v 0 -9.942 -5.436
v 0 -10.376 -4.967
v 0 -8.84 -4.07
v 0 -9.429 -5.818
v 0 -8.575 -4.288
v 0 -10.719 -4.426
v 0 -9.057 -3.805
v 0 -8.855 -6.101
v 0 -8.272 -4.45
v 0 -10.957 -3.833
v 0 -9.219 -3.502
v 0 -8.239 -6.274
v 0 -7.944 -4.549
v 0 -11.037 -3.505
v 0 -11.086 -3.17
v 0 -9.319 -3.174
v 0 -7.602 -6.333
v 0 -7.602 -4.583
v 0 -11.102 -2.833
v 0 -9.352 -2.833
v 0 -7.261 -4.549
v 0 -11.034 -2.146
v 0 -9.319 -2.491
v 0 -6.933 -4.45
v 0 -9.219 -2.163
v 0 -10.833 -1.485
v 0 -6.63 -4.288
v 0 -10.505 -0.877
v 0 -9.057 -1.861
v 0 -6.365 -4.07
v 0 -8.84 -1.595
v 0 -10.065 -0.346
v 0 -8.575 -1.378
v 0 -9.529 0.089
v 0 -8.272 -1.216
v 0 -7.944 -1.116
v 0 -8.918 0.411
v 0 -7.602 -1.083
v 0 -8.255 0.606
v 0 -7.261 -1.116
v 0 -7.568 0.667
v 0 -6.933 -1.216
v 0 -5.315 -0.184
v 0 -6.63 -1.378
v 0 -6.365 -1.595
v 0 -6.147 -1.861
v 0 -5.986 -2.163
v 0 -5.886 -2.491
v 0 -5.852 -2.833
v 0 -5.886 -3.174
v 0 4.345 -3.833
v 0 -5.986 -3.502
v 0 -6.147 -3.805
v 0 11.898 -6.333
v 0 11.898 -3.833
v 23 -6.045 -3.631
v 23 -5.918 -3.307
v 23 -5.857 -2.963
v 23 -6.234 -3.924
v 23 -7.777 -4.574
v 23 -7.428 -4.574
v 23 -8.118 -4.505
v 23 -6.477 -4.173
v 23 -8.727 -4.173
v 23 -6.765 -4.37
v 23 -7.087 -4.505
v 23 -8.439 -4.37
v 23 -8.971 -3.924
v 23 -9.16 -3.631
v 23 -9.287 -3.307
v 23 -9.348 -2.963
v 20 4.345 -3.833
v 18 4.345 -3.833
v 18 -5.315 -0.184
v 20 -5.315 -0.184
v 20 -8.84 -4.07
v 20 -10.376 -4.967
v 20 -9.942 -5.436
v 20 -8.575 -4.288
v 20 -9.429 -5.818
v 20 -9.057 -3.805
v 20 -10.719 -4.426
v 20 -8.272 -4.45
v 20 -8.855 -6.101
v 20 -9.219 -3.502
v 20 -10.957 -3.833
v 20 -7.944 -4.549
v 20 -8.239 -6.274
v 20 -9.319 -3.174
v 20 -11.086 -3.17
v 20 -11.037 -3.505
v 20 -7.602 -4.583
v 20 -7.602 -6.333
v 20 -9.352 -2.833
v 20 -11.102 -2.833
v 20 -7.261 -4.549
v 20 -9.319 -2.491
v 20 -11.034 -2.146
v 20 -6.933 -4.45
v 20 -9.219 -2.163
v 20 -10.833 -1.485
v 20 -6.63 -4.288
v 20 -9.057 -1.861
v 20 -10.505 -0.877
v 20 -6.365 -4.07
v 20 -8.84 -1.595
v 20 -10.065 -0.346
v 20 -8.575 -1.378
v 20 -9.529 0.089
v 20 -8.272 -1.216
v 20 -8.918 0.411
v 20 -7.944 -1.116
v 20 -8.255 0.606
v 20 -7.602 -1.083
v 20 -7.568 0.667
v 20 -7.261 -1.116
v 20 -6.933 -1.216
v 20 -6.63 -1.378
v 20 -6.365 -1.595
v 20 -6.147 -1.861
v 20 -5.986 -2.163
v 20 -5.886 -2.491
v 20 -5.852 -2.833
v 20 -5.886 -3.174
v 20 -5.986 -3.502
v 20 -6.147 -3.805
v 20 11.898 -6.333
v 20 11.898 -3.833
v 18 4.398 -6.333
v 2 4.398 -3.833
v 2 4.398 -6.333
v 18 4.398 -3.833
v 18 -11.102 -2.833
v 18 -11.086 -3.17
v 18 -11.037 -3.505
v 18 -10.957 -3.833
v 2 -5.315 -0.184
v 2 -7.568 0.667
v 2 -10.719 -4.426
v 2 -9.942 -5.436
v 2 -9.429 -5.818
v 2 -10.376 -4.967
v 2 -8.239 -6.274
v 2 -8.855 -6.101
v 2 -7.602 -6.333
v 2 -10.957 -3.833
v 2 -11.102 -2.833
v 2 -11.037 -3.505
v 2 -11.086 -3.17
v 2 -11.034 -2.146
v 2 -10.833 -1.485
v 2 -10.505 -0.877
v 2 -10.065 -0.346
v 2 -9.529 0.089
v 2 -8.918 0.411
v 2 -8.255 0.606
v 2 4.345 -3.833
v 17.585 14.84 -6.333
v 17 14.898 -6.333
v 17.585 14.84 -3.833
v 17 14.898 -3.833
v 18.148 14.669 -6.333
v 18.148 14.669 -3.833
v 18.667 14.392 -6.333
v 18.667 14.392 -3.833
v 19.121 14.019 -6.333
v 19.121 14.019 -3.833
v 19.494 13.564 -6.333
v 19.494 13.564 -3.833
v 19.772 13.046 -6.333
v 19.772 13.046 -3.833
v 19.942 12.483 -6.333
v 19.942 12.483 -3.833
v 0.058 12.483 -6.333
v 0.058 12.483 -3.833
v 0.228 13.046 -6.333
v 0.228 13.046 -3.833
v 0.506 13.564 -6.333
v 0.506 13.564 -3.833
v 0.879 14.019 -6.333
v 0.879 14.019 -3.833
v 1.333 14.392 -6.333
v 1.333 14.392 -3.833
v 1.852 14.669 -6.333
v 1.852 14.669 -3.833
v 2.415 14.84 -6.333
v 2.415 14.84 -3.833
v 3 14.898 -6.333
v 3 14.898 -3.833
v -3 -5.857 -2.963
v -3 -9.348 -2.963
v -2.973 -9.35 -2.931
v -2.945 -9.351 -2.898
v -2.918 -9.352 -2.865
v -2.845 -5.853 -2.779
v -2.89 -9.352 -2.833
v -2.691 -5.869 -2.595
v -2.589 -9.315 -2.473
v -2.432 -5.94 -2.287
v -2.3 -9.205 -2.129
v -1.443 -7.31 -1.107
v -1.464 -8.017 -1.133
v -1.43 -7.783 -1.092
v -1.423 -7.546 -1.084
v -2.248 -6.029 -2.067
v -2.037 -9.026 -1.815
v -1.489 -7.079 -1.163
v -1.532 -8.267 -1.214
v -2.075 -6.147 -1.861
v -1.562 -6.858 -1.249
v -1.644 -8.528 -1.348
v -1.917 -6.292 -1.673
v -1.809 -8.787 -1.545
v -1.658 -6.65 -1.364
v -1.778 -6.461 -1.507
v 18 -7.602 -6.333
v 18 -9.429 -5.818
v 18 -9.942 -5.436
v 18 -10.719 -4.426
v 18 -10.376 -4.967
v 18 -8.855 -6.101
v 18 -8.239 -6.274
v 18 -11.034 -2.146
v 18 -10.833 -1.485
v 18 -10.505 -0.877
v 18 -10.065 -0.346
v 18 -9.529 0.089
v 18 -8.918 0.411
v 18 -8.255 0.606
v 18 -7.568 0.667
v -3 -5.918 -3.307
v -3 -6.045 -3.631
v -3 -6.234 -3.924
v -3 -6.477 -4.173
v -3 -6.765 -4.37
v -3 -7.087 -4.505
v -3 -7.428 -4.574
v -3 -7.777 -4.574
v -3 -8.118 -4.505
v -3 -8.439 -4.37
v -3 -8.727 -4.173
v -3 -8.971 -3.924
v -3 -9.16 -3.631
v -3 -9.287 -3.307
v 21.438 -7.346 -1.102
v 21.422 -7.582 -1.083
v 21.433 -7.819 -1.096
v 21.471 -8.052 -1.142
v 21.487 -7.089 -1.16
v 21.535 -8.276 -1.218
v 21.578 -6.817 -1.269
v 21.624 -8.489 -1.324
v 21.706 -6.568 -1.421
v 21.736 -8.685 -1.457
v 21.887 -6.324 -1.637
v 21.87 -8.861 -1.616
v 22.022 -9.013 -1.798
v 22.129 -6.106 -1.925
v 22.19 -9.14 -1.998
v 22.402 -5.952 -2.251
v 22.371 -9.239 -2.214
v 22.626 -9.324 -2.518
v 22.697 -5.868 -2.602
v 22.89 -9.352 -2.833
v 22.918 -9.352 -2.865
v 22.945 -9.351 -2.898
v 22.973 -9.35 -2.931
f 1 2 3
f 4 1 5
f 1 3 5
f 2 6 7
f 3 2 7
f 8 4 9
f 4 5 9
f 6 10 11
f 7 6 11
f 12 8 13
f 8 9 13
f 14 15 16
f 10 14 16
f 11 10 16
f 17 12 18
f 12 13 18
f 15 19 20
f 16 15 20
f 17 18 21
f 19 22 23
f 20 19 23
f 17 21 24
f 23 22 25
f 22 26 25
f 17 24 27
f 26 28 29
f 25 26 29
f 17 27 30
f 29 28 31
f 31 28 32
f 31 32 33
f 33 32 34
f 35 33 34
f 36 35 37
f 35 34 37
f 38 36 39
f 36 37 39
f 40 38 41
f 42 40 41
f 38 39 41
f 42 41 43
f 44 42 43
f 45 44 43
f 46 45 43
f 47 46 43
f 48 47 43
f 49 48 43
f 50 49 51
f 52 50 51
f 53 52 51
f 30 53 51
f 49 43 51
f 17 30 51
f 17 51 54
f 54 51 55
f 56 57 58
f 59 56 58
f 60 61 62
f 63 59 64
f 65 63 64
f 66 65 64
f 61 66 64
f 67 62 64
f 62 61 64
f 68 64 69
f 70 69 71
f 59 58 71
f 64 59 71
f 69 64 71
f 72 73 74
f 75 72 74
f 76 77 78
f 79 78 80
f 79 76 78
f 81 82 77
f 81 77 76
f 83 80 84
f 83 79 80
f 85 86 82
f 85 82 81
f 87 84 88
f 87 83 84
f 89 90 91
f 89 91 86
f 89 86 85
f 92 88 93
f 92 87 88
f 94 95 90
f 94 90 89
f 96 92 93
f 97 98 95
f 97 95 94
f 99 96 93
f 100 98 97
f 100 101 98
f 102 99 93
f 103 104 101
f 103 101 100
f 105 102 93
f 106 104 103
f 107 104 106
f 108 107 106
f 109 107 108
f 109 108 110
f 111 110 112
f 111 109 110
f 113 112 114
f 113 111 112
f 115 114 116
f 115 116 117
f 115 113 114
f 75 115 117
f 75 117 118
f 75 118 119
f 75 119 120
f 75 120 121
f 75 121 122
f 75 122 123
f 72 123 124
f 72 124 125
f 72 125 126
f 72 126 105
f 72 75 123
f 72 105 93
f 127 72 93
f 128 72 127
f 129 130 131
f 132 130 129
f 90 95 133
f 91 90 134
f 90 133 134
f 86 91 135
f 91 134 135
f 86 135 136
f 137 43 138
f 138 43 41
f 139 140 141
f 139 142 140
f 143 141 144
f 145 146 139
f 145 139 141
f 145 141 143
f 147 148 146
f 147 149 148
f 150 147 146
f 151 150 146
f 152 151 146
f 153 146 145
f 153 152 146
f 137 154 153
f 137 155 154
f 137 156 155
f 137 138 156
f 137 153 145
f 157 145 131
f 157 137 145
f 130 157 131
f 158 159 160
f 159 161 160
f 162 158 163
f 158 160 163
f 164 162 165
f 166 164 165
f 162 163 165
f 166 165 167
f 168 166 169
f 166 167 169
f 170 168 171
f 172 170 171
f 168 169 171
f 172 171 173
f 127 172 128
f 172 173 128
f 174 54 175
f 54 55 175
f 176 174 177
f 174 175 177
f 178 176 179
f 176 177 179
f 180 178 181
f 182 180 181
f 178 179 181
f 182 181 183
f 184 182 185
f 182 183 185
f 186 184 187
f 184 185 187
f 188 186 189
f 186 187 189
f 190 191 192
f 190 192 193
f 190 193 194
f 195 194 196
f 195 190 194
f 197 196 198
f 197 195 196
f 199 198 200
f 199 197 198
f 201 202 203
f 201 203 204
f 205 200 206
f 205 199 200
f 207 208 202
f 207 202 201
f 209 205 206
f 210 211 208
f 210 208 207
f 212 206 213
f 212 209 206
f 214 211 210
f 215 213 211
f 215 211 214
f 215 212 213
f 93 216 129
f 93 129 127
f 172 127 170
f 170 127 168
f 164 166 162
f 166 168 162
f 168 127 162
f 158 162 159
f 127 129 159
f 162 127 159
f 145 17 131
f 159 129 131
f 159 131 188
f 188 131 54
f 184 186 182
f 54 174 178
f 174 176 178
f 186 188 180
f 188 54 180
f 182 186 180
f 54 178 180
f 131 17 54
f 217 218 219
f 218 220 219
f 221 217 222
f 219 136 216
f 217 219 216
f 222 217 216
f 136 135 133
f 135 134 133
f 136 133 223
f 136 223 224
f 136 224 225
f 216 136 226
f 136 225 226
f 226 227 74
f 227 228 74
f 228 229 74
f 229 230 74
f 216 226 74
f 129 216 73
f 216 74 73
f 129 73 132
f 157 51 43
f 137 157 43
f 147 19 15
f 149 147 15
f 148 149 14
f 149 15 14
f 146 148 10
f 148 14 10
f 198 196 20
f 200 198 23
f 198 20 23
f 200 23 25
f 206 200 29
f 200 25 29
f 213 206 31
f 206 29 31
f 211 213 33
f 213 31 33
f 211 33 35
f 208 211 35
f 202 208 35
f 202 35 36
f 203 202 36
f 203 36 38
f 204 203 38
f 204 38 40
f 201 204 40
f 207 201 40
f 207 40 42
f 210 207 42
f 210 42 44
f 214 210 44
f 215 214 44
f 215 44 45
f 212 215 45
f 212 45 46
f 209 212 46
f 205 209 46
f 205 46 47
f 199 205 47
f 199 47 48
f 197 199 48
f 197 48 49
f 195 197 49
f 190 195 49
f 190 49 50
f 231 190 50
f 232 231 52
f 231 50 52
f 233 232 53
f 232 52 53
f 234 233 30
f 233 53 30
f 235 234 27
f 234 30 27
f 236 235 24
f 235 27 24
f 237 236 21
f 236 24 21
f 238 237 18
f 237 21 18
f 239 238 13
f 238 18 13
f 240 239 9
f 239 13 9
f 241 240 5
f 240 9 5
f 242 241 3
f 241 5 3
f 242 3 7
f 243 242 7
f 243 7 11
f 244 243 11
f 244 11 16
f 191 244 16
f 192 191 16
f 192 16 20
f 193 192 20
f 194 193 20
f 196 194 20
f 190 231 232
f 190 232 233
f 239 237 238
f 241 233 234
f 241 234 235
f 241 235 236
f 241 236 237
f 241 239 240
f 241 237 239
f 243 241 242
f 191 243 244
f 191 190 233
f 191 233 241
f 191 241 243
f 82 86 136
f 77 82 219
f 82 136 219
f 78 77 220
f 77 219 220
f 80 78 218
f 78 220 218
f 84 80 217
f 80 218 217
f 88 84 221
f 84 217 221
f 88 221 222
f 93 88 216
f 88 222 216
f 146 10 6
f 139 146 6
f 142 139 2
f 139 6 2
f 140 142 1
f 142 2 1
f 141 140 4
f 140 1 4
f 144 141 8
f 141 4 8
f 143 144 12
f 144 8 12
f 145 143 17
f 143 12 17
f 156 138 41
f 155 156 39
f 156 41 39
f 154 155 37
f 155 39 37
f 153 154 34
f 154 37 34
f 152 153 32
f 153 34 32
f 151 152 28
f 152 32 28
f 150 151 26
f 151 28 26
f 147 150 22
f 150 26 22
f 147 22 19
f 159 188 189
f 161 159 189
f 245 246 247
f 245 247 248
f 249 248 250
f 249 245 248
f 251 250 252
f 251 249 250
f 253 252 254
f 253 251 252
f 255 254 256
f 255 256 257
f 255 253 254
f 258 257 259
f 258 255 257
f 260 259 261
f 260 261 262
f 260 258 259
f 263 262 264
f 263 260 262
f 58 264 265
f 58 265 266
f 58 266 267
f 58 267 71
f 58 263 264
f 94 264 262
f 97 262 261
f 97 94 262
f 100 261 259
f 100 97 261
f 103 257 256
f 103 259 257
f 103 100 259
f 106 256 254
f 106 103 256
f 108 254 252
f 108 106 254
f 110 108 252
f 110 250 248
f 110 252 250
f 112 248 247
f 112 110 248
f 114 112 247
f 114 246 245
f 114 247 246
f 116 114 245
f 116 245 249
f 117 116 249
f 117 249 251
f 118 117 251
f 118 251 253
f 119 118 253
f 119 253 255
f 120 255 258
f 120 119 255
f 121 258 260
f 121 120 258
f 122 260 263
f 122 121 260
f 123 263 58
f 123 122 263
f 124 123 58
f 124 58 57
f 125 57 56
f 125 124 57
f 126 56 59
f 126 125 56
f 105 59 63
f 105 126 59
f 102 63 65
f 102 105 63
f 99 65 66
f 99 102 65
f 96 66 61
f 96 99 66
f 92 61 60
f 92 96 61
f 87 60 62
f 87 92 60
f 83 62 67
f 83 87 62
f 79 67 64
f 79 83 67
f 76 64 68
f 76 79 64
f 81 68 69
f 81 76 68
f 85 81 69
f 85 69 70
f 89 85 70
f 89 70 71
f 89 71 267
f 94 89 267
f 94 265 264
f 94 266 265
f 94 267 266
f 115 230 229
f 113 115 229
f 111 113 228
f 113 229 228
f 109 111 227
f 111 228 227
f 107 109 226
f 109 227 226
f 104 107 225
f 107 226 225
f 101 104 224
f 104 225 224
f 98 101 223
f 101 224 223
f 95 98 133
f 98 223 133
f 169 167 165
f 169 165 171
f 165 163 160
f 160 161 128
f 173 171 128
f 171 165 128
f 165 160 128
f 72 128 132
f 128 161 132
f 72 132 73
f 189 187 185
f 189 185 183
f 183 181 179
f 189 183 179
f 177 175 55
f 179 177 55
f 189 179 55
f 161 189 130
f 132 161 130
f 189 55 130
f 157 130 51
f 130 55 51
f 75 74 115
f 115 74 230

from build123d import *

# Parameters (mm, degrees)
F1_DEPTH  = 20
F2_R      = 1.75
F3_DEPTH  = 3
F6_W      = 16
F6_H      = 35.2884006159
F7_DEPTH  = 12.5
F8_R      = 3
F10_DEPTH = 25


with BuildPart() as f1:
    # F0 (on Right) → F1 (new body)
    with BuildSketch(Plane.YZ):
        with BuildLine():
            ThreePointArc((-4.1024079025, -2.8327919807), (-4.4198799521, -1.3762495526), (-5.3147026709, -0.1839422731))
            Line((-5.3147026709, -0.1839422731), (-7.5675635352, 0.6670345679))
            ThreePointArc((-7.5675635352, 0.6670345679), (-10.0649314774, -0.3456294121), (-11.1024079025, -2.8327919807))
            Line((-11.1024079025, -2.8327919807), (-7.6024079025, -2.8327919807))
            Line((-7.6024079025, -2.8327919807), (-4.1024079025, -2.8327919807))
        make_face()
        with BuildLine():
            Line((-10.9565098687, -3.8327919807), (-7.6024079025, -3.8327919807))
            Line((-7.6024079025, -3.8327919807), (-7.6024079025, -2.8327919807))
            Line((-7.6024079025, -2.8327919807), (-11.1024079025, -2.8327919807))
            ThreePointArc((-11.1024079025, -2.8327919807), (-11.0657413316, -3.3380855182), (-10.9565098687, -3.8327919807))
        make_face()
        with BuildLine():
            Line((-7.6024079025, -3.8327919807), (-4.2483059362, -3.8327919807))
            ThreePointArc((-4.2483059362, -3.8327919807), (-4.1390744734, -3.3380855182), (-4.1024079025, -2.8327919807))
            Line((-4.1024079025, -2.8327919807), (-7.6024079025, -2.8327919807))
            Line((-7.6024079025, -2.8327919807), (-7.6024079025, -3.8327919807))
        make_face()
        with BuildLine():
            Line((-7.6024079025, -6.3327919807), (-7.6024079025, -3.8327919807))
            Line((-7.6024079025, -3.8327919807), (-10.9565098687, -3.8327919807))
            ThreePointArc((-10.9565098687, -3.8327919807), (-9.6940579688, -5.6390350208), (-7.6024079025, -6.3327919807))
        make_face()
        with BuildLine():
            ThreePointArc((-7.6024079025, -6.3327919807), (-5.5107578361, -5.6390350208), (-4.2483059362, -3.8327919807))
            Line((-4.2483059362, -3.8327919807), (-7.6024079025, -3.8327919807))
            Line((-7.6024079025, -3.8327919807), (-7.6024079025, -6.3327919807))
        make_face()
        with BuildLine():
            Line((14.8975920975, -3.8327919807), (4.3451967649, -3.8327919807))
            Line((4.3451967649, -3.8327919807), (-4.2483059362, -3.8327919807))
            ThreePointArc((-4.2483059362, -3.8327919807), (-5.5107578361, -5.6390350208), (-7.6024079025, -6.3327919807))
            Line((-7.6024079025, -6.3327919807), (14.8975920975, -6.3327919807))
            Line((14.8975920975, -6.3327919807), (14.8975920975, -3.8327919807))
        make_face()
        with BuildLine():
            Line((-4.2483059362, -3.8327919807), (4.3451967649, -3.8327919807))
            Line((4.3451967649, -3.8327919807), (-5.3147026709, -0.1839422731))
            ThreePointArc((-5.3147026709, -0.1839422731), (-4.4198799521, -1.3762495526), (-4.1024079025, -2.8327919807))
            ThreePointArc((-4.1024079025, -2.8327919807), (-4.1390744734, -3.3380855182), (-4.2483059362, -3.8327919807))
        make_face()
    extrude(amount=F1_DEPTH)



with BuildPart() as f3:
    # F2 (on face) → F3 (new body)
    with BuildSketch(Plane(origin=(0, 0, 0), x_dir=(0, -1, 0), z_dir=(-1, 0, 0))):
        with Locations((7.6024079025, -2.8327919807)):
            Circle(F2_R)
    extrude(amount=F3_DEPTH)


with BuildPart() as f1_1:
    add(f1.part)

    add(f3.part)  # F5 merges F3
    # F5: F3 across plane
    add(f3.part.mirror(Plane.YZ.offset(10)))

    # F6 (on face) → F7 (cut, symmetric)
    with BuildSketch(Plane.XY.offset(-3.8327919807)):
        with Locations((10, -13.2466082104)):
            Rectangle(F6_W, F6_H)
    extrude(amount=F7_DEPTH, both=True, mode=Mode.SUBTRACT)

    # F8
    f8_edges = [f1_1.edges().sort_by_distance(p)[0] for p in [
        (20, 14.897592, -5.082792),
        (0, 14.897592, -5.082792),
    ]]
    fillet(f8_edges, radius=F8_R)


with BuildPart() as f10:
    # F9 (on Front) → F10 (new body)
    with BuildSketch(Plane.XZ):
        Polygon((20.3534542639, 3.3057429828), (20.3534542639, 0.1906278993), (23.9095985889, -4.0474198759), (23.9095985889, 7.1602235548), (-3.9095985889, 7.1602235548), (-3.9095985889, -4.0474198759), (-0.3534542639, 0.1906278993), (-0.3534542639, 3.3057429828), align=None)
    extrude(amount=F10_DEPTH)


with BuildPart() as f1_2:
    add(f1_1.part)

    # F11: cut F10
    add(f10.part, mode=Mode.SUBTRACT)


solid = f1_2.part
